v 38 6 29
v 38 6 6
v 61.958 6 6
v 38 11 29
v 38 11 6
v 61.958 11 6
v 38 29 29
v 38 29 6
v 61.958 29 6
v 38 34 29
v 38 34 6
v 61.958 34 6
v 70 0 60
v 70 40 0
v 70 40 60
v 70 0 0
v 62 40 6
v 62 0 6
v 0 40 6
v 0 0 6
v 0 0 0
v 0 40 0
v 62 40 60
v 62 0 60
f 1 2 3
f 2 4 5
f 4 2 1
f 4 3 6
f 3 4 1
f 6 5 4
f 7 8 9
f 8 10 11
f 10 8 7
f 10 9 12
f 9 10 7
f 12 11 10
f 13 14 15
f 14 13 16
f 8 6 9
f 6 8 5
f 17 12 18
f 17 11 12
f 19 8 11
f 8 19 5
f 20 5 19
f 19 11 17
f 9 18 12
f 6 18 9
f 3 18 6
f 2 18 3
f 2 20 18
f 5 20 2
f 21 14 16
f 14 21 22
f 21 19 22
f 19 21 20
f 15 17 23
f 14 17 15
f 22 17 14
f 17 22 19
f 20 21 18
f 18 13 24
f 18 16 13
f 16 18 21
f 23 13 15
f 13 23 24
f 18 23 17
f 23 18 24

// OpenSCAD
$fn = 32;

// ----------------------------------------------------------------------
// Rib bracket: 2-gusset L bracket
// ----------------------------------------------------------------------

// --- parameters (mm) ---
base_l = 70;              // foot length, X
base_w = 40;              // foot width, Y
base_t = 6;               // foot thickness
plate_t = 8;              // upright plate thickness
plate_h = 60;             // overall height
gus_l = 24;               // gusset leg along the foot
gus_h = 24;               // gusset height
gus_t = 5;                // gusset thickness
gus_edge = 6;             // gusset margin from the foot edge
n_gus = 2;                // gusset count

gus_pitch = (base_w - 2 * gus_edge - gus_t) / (n_gus - 1);  // gusset pitch

union() {
  cube([base_l, base_w, base_t]);
  translate([base_l - plate_t, 0, base_t - 1])
    cube([plate_t, base_w, plate_h - base_t + 1]);
  for (i = [0 : n_gus - 1])
    translate([base_l - plate_t - gus_l, gus_edge + i * gus_pitch, base_t - 1])
      rotate([-90, 0, 0])
        linear_extrude(height = gus_t)
          polygon(points = [[0, 0], [gus_l + 1, 0], [0, -gus_h]]);
}
